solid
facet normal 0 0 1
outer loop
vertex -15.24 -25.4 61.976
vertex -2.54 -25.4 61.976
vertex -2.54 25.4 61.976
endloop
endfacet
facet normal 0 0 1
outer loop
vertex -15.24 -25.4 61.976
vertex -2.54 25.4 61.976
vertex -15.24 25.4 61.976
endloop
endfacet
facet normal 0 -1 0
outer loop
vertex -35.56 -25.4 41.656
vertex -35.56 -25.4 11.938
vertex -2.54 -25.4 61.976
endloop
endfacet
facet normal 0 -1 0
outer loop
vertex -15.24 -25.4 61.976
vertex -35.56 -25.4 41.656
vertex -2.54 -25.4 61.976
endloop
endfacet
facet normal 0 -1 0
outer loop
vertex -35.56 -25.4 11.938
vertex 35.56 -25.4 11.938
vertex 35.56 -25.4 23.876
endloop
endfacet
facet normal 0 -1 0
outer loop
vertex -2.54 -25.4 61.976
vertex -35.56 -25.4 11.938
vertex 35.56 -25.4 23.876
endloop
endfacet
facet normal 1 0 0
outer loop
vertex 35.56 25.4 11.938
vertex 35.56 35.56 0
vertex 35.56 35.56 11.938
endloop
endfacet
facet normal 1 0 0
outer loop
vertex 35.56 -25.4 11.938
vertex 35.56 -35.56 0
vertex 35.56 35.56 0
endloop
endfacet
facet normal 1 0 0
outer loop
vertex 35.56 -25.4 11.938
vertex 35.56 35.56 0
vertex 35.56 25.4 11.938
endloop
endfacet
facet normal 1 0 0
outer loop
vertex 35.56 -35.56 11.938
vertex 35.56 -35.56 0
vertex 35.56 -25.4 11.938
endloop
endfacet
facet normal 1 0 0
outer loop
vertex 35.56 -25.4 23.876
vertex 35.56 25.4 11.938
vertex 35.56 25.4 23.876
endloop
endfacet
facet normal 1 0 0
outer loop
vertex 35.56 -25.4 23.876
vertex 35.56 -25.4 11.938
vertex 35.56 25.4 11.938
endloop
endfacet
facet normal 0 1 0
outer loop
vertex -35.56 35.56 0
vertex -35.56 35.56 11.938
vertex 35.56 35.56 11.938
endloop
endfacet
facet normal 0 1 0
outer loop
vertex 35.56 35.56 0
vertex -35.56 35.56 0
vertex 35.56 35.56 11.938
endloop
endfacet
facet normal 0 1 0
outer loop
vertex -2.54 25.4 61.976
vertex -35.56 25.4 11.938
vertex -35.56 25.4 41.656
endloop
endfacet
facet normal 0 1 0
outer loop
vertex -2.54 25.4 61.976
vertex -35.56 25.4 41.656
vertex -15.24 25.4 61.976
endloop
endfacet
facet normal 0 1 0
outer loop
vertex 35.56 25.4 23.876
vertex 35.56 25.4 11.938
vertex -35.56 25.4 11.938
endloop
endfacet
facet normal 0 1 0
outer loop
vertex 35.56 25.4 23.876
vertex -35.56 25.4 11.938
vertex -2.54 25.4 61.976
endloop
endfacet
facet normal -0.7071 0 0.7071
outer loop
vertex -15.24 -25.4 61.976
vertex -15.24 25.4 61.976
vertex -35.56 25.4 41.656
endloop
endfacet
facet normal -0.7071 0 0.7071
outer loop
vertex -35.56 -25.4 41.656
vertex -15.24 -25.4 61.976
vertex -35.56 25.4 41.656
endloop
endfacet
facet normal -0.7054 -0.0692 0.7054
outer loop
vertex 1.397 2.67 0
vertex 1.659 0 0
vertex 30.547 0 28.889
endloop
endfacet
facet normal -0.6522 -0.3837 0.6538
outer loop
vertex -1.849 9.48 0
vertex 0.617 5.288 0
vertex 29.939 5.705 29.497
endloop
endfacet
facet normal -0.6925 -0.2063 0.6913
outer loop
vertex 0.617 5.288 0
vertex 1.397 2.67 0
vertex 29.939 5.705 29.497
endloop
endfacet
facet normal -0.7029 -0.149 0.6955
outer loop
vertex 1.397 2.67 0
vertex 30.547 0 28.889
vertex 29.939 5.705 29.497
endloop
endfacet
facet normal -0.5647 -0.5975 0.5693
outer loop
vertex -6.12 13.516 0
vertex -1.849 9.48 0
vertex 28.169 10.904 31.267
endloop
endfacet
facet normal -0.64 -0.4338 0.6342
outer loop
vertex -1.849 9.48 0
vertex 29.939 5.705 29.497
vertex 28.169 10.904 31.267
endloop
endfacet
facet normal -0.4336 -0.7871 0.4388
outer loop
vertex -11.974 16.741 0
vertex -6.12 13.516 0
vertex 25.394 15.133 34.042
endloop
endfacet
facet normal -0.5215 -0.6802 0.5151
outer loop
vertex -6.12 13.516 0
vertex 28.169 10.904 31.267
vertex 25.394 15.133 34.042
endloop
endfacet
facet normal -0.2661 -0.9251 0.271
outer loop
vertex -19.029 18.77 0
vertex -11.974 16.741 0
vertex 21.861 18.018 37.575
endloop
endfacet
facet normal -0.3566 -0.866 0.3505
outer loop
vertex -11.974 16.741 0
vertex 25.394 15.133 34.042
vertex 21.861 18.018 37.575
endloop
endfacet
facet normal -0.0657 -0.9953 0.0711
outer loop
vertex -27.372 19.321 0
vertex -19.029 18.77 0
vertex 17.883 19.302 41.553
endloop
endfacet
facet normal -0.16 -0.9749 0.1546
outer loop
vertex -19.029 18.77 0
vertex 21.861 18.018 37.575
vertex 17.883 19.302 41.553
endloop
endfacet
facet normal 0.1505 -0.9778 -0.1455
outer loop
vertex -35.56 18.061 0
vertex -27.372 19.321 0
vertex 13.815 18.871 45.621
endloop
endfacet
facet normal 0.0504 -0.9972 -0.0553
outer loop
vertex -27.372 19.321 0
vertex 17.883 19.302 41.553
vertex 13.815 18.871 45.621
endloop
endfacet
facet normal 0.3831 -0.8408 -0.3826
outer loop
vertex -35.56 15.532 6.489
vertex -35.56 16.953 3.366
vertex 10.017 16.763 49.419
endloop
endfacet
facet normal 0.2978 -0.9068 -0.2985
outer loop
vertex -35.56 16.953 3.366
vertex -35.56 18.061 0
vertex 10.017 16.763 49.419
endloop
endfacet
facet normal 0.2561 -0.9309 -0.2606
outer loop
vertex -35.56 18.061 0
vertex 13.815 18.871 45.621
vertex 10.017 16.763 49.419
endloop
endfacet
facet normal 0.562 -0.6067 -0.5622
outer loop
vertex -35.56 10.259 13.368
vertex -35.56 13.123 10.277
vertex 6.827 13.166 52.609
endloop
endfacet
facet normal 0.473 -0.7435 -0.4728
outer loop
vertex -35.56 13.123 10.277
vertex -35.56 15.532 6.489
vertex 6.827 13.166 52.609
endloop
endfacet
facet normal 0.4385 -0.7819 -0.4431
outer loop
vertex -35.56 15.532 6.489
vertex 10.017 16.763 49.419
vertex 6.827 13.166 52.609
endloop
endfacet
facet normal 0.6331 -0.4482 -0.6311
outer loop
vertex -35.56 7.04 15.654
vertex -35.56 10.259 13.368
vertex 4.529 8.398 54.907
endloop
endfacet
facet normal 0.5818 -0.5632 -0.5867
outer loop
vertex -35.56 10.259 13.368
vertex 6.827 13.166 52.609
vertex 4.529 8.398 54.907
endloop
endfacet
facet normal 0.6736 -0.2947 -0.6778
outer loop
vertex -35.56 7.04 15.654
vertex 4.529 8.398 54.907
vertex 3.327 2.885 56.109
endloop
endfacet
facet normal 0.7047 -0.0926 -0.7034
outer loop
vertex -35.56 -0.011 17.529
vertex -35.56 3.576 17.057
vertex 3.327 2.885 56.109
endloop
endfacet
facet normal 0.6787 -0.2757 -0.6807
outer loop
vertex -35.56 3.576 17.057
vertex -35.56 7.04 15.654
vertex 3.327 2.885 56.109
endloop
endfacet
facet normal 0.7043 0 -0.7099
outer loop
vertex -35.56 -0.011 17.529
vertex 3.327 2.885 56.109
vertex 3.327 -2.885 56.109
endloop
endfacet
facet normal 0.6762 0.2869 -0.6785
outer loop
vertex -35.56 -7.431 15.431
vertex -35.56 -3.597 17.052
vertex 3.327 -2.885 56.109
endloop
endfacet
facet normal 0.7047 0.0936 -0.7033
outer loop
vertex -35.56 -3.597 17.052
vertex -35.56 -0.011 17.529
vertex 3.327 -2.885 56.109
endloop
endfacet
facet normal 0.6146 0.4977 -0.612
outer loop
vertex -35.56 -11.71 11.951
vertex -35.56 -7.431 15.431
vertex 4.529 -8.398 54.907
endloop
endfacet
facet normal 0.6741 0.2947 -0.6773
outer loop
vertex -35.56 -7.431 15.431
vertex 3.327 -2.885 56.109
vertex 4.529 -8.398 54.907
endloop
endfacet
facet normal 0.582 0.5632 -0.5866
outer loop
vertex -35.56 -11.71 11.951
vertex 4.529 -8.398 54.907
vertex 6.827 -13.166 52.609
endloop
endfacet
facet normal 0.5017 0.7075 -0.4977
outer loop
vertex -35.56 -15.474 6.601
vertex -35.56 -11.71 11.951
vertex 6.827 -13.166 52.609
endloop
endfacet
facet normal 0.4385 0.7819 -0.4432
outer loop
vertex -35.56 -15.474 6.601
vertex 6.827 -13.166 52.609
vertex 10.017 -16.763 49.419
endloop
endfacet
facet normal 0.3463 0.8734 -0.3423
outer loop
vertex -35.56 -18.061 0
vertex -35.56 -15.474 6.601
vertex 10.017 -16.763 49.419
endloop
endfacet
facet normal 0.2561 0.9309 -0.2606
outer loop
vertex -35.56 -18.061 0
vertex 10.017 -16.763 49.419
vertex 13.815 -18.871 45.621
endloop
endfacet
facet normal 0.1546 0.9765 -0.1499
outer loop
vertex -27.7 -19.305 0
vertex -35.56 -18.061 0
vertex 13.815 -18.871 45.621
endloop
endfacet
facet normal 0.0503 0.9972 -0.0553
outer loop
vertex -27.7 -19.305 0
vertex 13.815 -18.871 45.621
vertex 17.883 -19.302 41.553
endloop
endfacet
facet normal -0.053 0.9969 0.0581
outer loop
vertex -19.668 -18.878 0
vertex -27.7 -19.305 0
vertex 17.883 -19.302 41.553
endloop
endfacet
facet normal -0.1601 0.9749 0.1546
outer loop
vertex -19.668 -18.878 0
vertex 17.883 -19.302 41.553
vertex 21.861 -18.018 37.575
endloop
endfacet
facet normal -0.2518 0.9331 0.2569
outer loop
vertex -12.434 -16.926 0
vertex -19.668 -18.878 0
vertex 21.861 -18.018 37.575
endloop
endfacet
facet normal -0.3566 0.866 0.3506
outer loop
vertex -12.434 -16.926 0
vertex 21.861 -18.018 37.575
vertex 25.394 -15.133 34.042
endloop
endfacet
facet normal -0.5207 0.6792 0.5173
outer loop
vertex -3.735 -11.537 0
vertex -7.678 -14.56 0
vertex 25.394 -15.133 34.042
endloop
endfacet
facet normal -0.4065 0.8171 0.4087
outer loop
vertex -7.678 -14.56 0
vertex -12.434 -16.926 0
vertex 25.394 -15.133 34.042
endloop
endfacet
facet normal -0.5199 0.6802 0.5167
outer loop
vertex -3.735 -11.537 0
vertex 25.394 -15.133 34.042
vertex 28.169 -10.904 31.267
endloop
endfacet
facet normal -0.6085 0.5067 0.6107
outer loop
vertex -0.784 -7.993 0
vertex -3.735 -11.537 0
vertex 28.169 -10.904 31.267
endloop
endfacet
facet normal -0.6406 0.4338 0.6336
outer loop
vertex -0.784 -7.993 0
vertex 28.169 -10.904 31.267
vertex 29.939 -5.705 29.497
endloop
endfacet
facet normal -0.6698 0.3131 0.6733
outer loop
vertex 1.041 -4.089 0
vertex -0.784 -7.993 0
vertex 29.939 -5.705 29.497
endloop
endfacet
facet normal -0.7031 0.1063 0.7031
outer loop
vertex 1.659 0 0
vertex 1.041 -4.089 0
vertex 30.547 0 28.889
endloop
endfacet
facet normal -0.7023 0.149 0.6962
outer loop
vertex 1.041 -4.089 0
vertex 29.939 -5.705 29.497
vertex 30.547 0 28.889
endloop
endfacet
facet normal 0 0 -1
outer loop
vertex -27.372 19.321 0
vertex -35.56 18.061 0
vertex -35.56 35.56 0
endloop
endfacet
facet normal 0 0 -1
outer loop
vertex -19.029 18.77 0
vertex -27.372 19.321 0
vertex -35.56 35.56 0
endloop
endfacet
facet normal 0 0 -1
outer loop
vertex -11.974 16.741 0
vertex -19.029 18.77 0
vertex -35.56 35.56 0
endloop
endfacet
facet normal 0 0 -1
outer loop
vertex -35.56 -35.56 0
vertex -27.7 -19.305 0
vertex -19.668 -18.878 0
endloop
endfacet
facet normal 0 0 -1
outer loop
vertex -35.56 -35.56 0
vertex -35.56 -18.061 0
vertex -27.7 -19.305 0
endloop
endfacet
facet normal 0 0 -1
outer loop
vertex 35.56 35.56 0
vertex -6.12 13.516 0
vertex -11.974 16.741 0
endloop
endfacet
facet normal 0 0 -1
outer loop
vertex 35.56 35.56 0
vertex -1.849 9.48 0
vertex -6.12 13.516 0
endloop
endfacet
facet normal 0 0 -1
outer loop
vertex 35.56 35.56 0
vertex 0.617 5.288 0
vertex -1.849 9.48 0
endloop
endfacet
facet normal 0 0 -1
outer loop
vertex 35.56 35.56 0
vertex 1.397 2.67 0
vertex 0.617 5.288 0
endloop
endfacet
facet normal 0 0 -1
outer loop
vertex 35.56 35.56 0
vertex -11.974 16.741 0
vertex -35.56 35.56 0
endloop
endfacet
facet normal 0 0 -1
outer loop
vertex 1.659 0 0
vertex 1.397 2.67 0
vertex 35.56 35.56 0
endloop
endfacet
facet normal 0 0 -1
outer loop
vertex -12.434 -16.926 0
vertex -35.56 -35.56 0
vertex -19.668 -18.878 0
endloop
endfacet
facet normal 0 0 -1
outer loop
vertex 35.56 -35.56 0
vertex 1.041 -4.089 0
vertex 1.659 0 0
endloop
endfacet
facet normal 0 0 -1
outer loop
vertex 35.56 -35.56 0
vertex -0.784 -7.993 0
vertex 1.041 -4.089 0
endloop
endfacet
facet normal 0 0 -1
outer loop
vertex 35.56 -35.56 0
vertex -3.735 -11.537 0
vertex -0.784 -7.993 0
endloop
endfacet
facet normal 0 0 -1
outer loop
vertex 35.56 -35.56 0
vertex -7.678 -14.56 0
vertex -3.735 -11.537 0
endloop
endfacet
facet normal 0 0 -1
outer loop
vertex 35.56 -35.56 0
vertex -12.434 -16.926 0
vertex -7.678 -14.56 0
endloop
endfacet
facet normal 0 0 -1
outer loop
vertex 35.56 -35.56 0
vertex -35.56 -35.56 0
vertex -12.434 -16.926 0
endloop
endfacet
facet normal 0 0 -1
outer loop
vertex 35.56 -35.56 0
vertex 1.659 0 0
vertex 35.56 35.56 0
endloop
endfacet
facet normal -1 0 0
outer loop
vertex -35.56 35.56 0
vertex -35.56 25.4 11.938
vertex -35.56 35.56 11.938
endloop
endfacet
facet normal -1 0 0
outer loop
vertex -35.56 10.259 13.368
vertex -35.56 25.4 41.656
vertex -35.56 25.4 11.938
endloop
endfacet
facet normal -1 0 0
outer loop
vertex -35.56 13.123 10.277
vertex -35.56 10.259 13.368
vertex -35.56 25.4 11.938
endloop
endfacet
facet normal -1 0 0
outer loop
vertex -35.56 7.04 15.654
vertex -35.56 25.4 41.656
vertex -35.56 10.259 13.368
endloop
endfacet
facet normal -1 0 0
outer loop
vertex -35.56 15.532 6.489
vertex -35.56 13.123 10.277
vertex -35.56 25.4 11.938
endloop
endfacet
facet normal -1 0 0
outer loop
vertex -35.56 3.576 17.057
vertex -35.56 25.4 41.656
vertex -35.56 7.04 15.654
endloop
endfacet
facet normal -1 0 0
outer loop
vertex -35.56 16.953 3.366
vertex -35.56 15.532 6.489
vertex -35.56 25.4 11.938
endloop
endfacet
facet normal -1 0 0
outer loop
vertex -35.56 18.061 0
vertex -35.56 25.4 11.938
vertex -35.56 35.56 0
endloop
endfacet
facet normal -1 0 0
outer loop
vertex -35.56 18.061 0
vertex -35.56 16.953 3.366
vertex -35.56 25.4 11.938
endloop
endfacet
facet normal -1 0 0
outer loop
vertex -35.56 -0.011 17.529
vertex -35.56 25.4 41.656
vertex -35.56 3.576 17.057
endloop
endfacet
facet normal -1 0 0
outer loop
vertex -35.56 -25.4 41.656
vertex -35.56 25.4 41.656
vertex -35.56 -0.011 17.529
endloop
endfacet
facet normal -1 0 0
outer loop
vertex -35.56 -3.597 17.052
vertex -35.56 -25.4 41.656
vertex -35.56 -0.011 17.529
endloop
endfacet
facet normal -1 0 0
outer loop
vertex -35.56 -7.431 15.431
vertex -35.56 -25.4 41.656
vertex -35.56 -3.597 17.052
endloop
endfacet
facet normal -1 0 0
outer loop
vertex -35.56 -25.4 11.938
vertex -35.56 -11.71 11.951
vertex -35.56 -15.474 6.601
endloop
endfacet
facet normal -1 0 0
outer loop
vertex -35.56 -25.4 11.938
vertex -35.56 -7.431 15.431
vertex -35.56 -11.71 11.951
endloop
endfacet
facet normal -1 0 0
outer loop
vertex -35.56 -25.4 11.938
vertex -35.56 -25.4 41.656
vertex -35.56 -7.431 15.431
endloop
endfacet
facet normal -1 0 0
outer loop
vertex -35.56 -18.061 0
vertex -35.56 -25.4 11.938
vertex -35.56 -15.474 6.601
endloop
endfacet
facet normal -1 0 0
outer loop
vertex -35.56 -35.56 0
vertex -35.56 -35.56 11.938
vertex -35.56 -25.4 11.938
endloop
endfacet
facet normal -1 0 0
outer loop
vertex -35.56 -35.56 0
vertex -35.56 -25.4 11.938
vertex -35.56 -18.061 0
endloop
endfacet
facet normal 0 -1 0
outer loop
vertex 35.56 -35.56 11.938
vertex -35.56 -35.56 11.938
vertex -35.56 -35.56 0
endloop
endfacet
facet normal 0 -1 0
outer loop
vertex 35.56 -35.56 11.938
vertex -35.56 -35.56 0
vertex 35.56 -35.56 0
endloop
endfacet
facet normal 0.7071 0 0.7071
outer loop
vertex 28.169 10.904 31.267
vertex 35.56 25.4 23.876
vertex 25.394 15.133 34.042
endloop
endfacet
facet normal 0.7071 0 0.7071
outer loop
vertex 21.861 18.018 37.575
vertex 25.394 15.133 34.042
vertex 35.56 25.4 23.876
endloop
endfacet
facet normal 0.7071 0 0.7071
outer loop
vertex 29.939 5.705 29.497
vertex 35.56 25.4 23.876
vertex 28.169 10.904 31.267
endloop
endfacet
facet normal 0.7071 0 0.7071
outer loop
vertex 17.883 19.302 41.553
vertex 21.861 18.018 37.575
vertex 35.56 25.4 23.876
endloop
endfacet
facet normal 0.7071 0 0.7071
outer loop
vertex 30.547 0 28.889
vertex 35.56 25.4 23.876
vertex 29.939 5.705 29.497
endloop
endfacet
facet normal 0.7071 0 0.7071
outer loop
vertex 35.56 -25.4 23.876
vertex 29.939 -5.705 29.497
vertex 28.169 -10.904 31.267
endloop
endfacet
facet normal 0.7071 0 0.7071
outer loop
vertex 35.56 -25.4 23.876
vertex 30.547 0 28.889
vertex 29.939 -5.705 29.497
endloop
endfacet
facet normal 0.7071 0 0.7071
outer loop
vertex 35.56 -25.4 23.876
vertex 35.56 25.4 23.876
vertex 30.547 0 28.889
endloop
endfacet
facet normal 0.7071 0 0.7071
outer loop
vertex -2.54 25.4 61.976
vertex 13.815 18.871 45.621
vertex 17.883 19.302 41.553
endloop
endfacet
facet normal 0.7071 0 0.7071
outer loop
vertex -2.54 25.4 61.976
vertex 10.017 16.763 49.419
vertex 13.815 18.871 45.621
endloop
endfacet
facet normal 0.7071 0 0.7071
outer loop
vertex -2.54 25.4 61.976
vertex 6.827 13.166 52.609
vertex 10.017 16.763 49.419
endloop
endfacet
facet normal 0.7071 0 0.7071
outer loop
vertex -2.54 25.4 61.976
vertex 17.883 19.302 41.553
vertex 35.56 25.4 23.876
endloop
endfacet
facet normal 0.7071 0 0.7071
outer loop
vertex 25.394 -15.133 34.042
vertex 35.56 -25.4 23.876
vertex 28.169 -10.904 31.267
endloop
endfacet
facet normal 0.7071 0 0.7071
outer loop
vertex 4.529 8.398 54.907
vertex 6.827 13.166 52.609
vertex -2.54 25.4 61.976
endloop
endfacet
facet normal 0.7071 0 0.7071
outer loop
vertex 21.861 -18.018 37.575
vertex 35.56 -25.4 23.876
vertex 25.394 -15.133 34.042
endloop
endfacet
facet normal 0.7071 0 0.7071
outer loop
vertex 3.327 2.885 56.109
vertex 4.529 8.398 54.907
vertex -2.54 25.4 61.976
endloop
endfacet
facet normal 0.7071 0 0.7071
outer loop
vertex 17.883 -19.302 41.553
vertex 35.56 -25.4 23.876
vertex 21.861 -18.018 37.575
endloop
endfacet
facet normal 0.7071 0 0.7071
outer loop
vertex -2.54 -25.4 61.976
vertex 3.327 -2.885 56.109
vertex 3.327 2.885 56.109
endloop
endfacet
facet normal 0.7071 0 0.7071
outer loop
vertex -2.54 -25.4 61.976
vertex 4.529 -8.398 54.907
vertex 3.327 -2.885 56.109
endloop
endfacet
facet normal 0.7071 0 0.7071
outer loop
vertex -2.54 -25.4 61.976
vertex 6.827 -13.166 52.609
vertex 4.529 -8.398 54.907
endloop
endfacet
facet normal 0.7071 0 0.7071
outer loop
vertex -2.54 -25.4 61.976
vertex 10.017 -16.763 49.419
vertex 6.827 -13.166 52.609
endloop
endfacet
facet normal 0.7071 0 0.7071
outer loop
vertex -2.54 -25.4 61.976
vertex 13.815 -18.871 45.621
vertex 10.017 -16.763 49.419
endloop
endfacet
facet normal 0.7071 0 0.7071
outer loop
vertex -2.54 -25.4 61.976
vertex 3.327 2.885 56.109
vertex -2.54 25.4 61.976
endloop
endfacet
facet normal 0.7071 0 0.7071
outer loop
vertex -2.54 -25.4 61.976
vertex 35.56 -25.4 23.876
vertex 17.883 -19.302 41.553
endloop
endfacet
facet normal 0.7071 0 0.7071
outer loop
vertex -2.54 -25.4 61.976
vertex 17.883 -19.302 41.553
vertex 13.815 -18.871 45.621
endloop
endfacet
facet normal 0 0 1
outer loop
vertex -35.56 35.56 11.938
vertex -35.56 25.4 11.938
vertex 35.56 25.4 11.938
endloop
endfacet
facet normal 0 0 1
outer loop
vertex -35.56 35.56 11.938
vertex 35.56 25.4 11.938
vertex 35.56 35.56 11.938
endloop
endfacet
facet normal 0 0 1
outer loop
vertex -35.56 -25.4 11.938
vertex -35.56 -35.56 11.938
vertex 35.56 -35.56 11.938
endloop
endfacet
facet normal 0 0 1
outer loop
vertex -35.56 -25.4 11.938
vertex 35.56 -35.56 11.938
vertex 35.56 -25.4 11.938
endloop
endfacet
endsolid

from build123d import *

# Parameters (mm, degrees)
F1_DEPTH = 35.56
F2_W     = 10.16
F2_H     = 50.038
F3_DEPTH = 71.121
F4_R     = 19.356185
F5_DEPTH = 67.173316


with BuildPart() as f1:
    # F0 (on Front) → F1 (new body, symmetric)
    with BuildSketch(Plane.XZ):
        Polygon((-35.56, 41.656), (-35.56, 0), (35.56, 0), (35.56, 23.876), (-2.54, 61.976), (-15.24, 61.976), align=None)
    extrude(amount=F1_DEPTH, both=True)

    # F2 (on face) → F3 (cut, through all)
    with BuildSketch(Plane.YZ.offset(35.56)):
        with Locations((-30.48, 36.957)):
            Rectangle(F2_W, F2_H)
        with Locations((30.48, 36.957)):
            Rectangle(F2_W, F2_H)
    extrude(amount=-F3_DEPTH, mode=Mode.SUBTRACT)

    # F4 (on face) → F5 (cut, through all)
    with BuildSketch(Plane(origin=(29.718, 0, 29.718), x_dir=(0.707107, 0, -0.707107), z_dir=(0.707107, 0, 0.707107))):
        with Locations((-18.183183, 0)):
            Circle(F4_R)
    extrude(amount=-F5_DEPTH, mode=Mode.SUBTRACT)


solid = f1.part
